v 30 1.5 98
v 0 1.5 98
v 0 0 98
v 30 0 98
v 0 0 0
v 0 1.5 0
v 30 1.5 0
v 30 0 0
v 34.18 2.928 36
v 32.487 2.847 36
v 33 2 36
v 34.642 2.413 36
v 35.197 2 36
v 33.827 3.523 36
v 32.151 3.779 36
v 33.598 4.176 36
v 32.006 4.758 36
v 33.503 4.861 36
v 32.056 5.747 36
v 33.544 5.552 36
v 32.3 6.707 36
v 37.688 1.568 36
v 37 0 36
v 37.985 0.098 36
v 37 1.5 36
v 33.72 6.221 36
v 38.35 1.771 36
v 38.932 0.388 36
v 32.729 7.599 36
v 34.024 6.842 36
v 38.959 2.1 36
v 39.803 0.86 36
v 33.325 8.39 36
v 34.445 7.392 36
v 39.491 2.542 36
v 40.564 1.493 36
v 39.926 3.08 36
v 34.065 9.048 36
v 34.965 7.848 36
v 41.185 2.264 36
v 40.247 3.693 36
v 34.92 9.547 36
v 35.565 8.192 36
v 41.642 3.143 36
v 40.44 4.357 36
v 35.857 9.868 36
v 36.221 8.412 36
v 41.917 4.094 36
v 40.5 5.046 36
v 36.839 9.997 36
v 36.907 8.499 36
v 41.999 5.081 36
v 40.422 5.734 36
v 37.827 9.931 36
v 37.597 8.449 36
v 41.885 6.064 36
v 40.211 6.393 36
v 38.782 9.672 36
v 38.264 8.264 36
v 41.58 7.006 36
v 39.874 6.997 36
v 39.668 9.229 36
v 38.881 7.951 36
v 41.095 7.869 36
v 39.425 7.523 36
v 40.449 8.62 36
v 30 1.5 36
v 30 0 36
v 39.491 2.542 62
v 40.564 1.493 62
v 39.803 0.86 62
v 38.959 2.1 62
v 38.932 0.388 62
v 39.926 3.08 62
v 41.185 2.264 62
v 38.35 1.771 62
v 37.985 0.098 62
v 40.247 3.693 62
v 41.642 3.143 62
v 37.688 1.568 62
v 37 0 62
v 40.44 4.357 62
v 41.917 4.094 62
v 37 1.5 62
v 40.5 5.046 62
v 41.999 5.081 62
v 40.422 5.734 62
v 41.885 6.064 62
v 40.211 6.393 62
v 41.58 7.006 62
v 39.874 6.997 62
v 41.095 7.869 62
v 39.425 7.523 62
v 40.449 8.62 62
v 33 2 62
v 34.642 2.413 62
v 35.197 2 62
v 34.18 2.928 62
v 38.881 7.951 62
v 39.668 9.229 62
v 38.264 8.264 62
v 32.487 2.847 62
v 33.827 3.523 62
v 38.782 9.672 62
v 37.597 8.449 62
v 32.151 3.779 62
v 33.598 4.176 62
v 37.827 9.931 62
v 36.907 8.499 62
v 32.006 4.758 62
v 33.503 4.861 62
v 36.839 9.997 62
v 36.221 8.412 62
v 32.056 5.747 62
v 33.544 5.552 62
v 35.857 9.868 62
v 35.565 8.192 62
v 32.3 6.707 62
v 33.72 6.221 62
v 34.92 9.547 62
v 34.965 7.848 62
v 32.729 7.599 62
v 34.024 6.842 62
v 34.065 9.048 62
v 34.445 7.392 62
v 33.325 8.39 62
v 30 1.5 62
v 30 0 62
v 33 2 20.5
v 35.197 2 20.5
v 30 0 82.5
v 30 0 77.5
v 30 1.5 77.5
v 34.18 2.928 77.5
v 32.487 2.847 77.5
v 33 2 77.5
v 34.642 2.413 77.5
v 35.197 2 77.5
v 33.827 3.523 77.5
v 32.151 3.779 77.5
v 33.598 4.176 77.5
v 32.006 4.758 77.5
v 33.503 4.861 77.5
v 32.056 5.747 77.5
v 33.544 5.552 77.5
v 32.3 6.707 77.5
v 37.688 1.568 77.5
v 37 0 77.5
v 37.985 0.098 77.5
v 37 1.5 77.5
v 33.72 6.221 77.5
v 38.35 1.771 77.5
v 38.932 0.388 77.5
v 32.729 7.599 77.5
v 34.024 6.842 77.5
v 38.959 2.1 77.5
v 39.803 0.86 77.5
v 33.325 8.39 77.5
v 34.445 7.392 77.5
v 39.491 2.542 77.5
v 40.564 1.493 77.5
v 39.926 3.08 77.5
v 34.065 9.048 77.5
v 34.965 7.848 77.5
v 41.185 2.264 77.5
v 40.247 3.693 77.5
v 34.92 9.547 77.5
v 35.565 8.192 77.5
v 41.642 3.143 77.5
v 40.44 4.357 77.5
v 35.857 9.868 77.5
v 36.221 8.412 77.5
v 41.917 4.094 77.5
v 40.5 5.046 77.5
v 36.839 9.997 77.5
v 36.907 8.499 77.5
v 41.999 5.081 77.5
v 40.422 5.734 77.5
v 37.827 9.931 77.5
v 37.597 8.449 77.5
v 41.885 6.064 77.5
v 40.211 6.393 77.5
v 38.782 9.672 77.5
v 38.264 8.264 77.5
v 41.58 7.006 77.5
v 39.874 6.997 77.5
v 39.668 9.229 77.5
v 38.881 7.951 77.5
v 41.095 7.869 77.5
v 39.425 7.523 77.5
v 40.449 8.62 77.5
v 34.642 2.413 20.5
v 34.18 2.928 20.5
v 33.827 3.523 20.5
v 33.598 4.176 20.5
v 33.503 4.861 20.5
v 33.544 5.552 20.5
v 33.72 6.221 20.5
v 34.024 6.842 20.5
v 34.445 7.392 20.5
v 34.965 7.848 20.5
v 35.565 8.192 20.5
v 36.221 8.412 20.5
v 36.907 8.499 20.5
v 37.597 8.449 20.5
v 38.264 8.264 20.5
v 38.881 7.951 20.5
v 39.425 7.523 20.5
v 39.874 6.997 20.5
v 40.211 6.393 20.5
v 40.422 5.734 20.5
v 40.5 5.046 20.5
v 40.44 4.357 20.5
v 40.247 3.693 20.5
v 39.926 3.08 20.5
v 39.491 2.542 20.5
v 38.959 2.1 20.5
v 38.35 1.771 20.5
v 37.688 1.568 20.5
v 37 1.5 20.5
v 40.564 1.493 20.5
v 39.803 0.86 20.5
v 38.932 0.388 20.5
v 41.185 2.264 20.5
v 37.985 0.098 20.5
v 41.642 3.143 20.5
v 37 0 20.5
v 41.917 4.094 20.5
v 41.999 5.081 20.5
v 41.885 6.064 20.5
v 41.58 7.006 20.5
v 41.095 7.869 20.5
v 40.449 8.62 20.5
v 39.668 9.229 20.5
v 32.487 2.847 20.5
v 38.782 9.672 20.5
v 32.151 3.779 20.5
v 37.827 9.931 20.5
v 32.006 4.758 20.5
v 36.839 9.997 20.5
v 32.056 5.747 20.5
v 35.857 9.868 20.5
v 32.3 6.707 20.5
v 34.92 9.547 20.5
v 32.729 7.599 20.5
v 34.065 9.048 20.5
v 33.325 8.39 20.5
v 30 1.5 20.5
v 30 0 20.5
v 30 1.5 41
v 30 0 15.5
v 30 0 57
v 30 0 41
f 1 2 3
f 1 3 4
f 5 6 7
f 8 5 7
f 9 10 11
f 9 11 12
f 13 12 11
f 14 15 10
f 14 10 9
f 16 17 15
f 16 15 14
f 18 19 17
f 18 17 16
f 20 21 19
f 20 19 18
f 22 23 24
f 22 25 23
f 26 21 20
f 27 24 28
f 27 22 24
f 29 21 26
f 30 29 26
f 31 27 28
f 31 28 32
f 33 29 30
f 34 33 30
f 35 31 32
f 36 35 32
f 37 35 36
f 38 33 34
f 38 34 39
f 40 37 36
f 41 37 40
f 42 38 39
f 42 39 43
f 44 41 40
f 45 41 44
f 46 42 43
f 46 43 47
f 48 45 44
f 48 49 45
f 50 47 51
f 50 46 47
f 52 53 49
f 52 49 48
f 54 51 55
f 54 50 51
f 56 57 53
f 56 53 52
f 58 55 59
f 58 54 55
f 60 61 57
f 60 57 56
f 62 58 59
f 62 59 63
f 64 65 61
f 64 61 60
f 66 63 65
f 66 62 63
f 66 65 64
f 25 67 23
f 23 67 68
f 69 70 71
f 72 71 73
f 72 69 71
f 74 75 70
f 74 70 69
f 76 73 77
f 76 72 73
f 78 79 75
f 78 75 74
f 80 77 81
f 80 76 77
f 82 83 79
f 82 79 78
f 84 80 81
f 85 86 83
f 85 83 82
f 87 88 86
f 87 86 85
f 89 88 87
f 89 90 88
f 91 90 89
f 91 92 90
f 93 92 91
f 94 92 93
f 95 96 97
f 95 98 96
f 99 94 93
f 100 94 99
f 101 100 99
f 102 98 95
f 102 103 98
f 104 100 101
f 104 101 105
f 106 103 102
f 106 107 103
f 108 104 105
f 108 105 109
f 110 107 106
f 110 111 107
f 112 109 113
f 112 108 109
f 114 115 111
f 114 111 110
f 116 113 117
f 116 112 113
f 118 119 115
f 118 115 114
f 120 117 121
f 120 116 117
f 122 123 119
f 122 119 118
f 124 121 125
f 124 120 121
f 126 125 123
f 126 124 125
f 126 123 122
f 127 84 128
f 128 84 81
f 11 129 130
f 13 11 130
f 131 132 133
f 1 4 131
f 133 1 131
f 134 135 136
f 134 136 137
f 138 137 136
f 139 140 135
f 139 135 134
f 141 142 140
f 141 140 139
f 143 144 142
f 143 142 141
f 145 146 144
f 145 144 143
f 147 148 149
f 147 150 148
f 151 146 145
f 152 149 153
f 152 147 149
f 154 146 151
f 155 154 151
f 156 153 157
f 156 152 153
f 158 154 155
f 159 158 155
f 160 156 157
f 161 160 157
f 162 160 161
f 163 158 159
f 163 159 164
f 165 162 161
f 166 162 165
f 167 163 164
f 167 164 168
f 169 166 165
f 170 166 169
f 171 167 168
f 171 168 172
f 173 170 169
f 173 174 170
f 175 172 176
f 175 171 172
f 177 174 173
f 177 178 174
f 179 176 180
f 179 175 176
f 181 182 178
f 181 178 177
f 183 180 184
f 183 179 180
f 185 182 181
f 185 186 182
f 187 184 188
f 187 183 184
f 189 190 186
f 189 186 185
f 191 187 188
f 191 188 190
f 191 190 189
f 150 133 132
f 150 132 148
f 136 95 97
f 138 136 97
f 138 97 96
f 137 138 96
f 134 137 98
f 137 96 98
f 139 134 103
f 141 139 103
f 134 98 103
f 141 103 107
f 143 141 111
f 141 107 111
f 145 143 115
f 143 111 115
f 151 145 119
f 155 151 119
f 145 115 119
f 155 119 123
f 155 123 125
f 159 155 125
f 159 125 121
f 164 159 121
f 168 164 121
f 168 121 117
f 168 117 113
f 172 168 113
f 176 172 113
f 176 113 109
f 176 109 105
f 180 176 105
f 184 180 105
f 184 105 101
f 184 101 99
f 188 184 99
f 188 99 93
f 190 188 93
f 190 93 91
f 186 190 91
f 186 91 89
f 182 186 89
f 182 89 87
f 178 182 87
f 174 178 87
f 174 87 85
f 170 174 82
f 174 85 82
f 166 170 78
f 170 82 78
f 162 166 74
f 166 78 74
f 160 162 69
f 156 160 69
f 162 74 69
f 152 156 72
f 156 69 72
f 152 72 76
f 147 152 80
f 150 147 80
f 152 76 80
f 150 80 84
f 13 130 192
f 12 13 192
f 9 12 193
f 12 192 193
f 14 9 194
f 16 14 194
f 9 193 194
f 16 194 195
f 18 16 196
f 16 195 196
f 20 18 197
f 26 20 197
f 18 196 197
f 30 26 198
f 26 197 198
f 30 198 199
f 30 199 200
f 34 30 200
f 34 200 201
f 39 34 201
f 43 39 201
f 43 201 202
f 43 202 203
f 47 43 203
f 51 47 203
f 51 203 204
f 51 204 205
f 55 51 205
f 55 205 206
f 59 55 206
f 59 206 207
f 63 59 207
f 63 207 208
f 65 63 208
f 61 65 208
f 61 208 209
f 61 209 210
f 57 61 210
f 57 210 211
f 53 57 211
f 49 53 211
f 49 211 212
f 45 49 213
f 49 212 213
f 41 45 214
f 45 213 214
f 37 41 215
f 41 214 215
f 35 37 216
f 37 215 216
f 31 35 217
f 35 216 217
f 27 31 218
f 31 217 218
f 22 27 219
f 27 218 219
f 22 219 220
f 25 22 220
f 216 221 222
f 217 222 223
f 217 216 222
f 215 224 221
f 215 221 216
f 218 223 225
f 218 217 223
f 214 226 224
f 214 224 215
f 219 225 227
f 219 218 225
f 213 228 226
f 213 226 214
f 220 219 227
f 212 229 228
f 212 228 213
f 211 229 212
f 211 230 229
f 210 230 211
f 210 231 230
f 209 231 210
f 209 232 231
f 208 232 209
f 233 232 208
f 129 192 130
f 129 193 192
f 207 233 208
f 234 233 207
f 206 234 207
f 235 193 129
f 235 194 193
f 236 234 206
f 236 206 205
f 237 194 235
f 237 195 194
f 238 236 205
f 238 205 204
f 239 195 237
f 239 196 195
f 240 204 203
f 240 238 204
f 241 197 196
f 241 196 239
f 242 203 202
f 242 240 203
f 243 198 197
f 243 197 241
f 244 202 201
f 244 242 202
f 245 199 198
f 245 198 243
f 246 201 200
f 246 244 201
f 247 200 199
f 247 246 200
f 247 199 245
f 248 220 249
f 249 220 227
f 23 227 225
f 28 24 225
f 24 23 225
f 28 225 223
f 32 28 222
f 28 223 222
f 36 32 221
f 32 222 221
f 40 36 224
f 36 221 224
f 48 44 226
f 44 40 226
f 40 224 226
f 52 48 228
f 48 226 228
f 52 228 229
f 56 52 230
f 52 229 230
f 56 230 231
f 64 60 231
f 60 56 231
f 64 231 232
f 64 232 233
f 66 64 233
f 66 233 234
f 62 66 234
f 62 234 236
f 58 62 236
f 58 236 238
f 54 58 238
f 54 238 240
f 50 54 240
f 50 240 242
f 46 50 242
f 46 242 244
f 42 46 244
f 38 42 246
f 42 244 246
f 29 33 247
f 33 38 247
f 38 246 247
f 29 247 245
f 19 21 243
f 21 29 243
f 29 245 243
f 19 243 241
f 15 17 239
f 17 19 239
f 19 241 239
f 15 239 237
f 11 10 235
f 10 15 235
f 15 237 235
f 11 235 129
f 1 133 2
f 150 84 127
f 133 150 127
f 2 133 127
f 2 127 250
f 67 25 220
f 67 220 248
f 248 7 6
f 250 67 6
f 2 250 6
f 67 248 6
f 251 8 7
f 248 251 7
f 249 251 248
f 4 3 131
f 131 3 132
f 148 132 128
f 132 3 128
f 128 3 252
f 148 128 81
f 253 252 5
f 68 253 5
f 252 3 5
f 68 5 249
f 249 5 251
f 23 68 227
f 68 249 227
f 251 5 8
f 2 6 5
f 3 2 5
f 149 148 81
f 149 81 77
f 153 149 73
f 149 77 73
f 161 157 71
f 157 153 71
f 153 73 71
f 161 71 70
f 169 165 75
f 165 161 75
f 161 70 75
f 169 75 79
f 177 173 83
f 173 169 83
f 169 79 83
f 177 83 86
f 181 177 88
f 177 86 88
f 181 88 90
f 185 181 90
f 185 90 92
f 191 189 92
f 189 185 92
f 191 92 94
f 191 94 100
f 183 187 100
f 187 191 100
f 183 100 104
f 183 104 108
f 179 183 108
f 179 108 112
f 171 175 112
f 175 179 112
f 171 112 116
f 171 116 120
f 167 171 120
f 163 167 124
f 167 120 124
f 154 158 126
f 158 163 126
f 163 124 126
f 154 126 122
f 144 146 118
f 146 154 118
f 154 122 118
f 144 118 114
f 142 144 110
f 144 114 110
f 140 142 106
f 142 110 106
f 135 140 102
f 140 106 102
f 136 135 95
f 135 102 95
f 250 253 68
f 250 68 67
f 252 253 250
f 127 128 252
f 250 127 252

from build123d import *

# Parameters (mm, degrees)
BOSS_EXTRUDE1_DEPTH = 98
SKETCH2_W           = 7
SKETCH2_H           = 16
SKETCH2_W_2         = 13.165812667
SKETCH2_H_2         = 15.5
CUT_EXTRUDE1_DEPTH  = 108.088748242
SKETCH4_W           = 12.746406598
SKETCH4_H           = 11.424724901
CUT_EXTRUDE3_DEPTH  = 5
SKETCH5_W           = 15.019607204
SKETCH5_H           = 11.204049301
CUT_EXTRUDE4_DEPTH  = 5
SKETCH6_W           = 13.795170111
SKETCH6_H           = 11.126039216
CUT_EXTRUDE5_DEPTH  = 5
SKETCH7_W           = 13.688711878
SKETCH7_H           = 12.195602477
CUT_EXTRUDE6_DEPTH  = 5


with BuildPart() as part:
    # Sketch1 → Boss-Extrude1 (new body)
    with BuildSketch(Plane.XY):
        with BuildLine():
            Line((0, 0), (30, 0))
            Line((30, 0), (32, 0))
            Line((32, 0), (37, 0))
            ThreePointArc((37, 0), (39.236067977, 9.472135955), (33, 2))
            Line((33, 2), (35.197224362, 2))
            ThreePointArc((35.197224362, 2), (37.935414347, 8.372684391), (37, 1.5))
            Line((37, 1.5), (32, 1.5))
            Line((32, 1.5), (30, 1.5))
            Line((30, 1.5), (0, 1.5))
            Line((0, 1.5), (0, 0))
        make_face()
    extrude(amount=BOSS_EXTRUDE1_DEPTH)

    # Sketch2 → Cut-Extrude1 (cut, through all)
    with BuildSketch(Plane.XZ):
        with Locations((33.5, 49)):
            Rectangle(SKETCH2_W, SKETCH2_H)
        with Locations((43.582906334, 49)):
            Rectangle(SKETCH2_W_2, SKETCH2_H)
        with Locations((33.5, 7.75)):
            Rectangle(SKETCH2_W, SKETCH2_H_2)
        with Locations((43.582906334, 7.75)):
            Rectangle(SKETCH2_W_2, SKETCH2_H_2)
        with Locations((33.5, 90.25)):
            Rectangle(SKETCH2_W, SKETCH2_H_2)
        with Locations((43.582906334, 90.25)):
            Rectangle(SKETCH2_W_2, SKETCH2_H_2)
    extrude(amount=-CUT_EXTRUDE1_DEPTH, mode=Mode.SUBTRACT)

    # Sketch4 → Cut-Extrude3 (cut)
    with BuildSketch(Plane.XY.offset(82.5)):
        with Locations((36.373203299, 5.712362451)):
            Rectangle(SKETCH4_W, SKETCH4_H)
    extrude(amount=-CUT_EXTRUDE3_DEPTH, mode=Mode.SUBTRACT)

    # Sketch5 → Cut-Extrude4 (cut)
    with BuildSketch(Plane(origin=(0, 0, 57), x_dir=(-1, 0, 0), z_dir=(0, 0, -1))):
        with Locations((-37.509803602, 5.602024651)):
            Rectangle(SKETCH5_W, SKETCH5_H)
    extrude(amount=-CUT_EXTRUDE4_DEPTH, mode=Mode.SUBTRACT)

    # Sketch6 → Cut-Extrude5 (cut)
    with BuildSketch(Plane.XY.offset(41)):
        with Locations((36.897585056, 5.563019608)):
            Rectangle(SKETCH6_W, SKETCH6_H)
    extrude(amount=-CUT_EXTRUDE5_DEPTH, mode=Mode.SUBTRACT)

    # Sketch7 → Cut-Extrude6 (cut)
    with BuildSketch(Plane(origin=(0, 0, 15.5), x_dir=(-1, 0, 0), z_dir=(0, 0, -1))):
        with Locations((-36.844355939, 6.097801239)):
            Rectangle(SKETCH7_W, SKETCH7_H)
    extrude(amount=-CUT_EXTRUDE6_DEPTH, mode=Mode.SUBTRACT)


solid = part.part
